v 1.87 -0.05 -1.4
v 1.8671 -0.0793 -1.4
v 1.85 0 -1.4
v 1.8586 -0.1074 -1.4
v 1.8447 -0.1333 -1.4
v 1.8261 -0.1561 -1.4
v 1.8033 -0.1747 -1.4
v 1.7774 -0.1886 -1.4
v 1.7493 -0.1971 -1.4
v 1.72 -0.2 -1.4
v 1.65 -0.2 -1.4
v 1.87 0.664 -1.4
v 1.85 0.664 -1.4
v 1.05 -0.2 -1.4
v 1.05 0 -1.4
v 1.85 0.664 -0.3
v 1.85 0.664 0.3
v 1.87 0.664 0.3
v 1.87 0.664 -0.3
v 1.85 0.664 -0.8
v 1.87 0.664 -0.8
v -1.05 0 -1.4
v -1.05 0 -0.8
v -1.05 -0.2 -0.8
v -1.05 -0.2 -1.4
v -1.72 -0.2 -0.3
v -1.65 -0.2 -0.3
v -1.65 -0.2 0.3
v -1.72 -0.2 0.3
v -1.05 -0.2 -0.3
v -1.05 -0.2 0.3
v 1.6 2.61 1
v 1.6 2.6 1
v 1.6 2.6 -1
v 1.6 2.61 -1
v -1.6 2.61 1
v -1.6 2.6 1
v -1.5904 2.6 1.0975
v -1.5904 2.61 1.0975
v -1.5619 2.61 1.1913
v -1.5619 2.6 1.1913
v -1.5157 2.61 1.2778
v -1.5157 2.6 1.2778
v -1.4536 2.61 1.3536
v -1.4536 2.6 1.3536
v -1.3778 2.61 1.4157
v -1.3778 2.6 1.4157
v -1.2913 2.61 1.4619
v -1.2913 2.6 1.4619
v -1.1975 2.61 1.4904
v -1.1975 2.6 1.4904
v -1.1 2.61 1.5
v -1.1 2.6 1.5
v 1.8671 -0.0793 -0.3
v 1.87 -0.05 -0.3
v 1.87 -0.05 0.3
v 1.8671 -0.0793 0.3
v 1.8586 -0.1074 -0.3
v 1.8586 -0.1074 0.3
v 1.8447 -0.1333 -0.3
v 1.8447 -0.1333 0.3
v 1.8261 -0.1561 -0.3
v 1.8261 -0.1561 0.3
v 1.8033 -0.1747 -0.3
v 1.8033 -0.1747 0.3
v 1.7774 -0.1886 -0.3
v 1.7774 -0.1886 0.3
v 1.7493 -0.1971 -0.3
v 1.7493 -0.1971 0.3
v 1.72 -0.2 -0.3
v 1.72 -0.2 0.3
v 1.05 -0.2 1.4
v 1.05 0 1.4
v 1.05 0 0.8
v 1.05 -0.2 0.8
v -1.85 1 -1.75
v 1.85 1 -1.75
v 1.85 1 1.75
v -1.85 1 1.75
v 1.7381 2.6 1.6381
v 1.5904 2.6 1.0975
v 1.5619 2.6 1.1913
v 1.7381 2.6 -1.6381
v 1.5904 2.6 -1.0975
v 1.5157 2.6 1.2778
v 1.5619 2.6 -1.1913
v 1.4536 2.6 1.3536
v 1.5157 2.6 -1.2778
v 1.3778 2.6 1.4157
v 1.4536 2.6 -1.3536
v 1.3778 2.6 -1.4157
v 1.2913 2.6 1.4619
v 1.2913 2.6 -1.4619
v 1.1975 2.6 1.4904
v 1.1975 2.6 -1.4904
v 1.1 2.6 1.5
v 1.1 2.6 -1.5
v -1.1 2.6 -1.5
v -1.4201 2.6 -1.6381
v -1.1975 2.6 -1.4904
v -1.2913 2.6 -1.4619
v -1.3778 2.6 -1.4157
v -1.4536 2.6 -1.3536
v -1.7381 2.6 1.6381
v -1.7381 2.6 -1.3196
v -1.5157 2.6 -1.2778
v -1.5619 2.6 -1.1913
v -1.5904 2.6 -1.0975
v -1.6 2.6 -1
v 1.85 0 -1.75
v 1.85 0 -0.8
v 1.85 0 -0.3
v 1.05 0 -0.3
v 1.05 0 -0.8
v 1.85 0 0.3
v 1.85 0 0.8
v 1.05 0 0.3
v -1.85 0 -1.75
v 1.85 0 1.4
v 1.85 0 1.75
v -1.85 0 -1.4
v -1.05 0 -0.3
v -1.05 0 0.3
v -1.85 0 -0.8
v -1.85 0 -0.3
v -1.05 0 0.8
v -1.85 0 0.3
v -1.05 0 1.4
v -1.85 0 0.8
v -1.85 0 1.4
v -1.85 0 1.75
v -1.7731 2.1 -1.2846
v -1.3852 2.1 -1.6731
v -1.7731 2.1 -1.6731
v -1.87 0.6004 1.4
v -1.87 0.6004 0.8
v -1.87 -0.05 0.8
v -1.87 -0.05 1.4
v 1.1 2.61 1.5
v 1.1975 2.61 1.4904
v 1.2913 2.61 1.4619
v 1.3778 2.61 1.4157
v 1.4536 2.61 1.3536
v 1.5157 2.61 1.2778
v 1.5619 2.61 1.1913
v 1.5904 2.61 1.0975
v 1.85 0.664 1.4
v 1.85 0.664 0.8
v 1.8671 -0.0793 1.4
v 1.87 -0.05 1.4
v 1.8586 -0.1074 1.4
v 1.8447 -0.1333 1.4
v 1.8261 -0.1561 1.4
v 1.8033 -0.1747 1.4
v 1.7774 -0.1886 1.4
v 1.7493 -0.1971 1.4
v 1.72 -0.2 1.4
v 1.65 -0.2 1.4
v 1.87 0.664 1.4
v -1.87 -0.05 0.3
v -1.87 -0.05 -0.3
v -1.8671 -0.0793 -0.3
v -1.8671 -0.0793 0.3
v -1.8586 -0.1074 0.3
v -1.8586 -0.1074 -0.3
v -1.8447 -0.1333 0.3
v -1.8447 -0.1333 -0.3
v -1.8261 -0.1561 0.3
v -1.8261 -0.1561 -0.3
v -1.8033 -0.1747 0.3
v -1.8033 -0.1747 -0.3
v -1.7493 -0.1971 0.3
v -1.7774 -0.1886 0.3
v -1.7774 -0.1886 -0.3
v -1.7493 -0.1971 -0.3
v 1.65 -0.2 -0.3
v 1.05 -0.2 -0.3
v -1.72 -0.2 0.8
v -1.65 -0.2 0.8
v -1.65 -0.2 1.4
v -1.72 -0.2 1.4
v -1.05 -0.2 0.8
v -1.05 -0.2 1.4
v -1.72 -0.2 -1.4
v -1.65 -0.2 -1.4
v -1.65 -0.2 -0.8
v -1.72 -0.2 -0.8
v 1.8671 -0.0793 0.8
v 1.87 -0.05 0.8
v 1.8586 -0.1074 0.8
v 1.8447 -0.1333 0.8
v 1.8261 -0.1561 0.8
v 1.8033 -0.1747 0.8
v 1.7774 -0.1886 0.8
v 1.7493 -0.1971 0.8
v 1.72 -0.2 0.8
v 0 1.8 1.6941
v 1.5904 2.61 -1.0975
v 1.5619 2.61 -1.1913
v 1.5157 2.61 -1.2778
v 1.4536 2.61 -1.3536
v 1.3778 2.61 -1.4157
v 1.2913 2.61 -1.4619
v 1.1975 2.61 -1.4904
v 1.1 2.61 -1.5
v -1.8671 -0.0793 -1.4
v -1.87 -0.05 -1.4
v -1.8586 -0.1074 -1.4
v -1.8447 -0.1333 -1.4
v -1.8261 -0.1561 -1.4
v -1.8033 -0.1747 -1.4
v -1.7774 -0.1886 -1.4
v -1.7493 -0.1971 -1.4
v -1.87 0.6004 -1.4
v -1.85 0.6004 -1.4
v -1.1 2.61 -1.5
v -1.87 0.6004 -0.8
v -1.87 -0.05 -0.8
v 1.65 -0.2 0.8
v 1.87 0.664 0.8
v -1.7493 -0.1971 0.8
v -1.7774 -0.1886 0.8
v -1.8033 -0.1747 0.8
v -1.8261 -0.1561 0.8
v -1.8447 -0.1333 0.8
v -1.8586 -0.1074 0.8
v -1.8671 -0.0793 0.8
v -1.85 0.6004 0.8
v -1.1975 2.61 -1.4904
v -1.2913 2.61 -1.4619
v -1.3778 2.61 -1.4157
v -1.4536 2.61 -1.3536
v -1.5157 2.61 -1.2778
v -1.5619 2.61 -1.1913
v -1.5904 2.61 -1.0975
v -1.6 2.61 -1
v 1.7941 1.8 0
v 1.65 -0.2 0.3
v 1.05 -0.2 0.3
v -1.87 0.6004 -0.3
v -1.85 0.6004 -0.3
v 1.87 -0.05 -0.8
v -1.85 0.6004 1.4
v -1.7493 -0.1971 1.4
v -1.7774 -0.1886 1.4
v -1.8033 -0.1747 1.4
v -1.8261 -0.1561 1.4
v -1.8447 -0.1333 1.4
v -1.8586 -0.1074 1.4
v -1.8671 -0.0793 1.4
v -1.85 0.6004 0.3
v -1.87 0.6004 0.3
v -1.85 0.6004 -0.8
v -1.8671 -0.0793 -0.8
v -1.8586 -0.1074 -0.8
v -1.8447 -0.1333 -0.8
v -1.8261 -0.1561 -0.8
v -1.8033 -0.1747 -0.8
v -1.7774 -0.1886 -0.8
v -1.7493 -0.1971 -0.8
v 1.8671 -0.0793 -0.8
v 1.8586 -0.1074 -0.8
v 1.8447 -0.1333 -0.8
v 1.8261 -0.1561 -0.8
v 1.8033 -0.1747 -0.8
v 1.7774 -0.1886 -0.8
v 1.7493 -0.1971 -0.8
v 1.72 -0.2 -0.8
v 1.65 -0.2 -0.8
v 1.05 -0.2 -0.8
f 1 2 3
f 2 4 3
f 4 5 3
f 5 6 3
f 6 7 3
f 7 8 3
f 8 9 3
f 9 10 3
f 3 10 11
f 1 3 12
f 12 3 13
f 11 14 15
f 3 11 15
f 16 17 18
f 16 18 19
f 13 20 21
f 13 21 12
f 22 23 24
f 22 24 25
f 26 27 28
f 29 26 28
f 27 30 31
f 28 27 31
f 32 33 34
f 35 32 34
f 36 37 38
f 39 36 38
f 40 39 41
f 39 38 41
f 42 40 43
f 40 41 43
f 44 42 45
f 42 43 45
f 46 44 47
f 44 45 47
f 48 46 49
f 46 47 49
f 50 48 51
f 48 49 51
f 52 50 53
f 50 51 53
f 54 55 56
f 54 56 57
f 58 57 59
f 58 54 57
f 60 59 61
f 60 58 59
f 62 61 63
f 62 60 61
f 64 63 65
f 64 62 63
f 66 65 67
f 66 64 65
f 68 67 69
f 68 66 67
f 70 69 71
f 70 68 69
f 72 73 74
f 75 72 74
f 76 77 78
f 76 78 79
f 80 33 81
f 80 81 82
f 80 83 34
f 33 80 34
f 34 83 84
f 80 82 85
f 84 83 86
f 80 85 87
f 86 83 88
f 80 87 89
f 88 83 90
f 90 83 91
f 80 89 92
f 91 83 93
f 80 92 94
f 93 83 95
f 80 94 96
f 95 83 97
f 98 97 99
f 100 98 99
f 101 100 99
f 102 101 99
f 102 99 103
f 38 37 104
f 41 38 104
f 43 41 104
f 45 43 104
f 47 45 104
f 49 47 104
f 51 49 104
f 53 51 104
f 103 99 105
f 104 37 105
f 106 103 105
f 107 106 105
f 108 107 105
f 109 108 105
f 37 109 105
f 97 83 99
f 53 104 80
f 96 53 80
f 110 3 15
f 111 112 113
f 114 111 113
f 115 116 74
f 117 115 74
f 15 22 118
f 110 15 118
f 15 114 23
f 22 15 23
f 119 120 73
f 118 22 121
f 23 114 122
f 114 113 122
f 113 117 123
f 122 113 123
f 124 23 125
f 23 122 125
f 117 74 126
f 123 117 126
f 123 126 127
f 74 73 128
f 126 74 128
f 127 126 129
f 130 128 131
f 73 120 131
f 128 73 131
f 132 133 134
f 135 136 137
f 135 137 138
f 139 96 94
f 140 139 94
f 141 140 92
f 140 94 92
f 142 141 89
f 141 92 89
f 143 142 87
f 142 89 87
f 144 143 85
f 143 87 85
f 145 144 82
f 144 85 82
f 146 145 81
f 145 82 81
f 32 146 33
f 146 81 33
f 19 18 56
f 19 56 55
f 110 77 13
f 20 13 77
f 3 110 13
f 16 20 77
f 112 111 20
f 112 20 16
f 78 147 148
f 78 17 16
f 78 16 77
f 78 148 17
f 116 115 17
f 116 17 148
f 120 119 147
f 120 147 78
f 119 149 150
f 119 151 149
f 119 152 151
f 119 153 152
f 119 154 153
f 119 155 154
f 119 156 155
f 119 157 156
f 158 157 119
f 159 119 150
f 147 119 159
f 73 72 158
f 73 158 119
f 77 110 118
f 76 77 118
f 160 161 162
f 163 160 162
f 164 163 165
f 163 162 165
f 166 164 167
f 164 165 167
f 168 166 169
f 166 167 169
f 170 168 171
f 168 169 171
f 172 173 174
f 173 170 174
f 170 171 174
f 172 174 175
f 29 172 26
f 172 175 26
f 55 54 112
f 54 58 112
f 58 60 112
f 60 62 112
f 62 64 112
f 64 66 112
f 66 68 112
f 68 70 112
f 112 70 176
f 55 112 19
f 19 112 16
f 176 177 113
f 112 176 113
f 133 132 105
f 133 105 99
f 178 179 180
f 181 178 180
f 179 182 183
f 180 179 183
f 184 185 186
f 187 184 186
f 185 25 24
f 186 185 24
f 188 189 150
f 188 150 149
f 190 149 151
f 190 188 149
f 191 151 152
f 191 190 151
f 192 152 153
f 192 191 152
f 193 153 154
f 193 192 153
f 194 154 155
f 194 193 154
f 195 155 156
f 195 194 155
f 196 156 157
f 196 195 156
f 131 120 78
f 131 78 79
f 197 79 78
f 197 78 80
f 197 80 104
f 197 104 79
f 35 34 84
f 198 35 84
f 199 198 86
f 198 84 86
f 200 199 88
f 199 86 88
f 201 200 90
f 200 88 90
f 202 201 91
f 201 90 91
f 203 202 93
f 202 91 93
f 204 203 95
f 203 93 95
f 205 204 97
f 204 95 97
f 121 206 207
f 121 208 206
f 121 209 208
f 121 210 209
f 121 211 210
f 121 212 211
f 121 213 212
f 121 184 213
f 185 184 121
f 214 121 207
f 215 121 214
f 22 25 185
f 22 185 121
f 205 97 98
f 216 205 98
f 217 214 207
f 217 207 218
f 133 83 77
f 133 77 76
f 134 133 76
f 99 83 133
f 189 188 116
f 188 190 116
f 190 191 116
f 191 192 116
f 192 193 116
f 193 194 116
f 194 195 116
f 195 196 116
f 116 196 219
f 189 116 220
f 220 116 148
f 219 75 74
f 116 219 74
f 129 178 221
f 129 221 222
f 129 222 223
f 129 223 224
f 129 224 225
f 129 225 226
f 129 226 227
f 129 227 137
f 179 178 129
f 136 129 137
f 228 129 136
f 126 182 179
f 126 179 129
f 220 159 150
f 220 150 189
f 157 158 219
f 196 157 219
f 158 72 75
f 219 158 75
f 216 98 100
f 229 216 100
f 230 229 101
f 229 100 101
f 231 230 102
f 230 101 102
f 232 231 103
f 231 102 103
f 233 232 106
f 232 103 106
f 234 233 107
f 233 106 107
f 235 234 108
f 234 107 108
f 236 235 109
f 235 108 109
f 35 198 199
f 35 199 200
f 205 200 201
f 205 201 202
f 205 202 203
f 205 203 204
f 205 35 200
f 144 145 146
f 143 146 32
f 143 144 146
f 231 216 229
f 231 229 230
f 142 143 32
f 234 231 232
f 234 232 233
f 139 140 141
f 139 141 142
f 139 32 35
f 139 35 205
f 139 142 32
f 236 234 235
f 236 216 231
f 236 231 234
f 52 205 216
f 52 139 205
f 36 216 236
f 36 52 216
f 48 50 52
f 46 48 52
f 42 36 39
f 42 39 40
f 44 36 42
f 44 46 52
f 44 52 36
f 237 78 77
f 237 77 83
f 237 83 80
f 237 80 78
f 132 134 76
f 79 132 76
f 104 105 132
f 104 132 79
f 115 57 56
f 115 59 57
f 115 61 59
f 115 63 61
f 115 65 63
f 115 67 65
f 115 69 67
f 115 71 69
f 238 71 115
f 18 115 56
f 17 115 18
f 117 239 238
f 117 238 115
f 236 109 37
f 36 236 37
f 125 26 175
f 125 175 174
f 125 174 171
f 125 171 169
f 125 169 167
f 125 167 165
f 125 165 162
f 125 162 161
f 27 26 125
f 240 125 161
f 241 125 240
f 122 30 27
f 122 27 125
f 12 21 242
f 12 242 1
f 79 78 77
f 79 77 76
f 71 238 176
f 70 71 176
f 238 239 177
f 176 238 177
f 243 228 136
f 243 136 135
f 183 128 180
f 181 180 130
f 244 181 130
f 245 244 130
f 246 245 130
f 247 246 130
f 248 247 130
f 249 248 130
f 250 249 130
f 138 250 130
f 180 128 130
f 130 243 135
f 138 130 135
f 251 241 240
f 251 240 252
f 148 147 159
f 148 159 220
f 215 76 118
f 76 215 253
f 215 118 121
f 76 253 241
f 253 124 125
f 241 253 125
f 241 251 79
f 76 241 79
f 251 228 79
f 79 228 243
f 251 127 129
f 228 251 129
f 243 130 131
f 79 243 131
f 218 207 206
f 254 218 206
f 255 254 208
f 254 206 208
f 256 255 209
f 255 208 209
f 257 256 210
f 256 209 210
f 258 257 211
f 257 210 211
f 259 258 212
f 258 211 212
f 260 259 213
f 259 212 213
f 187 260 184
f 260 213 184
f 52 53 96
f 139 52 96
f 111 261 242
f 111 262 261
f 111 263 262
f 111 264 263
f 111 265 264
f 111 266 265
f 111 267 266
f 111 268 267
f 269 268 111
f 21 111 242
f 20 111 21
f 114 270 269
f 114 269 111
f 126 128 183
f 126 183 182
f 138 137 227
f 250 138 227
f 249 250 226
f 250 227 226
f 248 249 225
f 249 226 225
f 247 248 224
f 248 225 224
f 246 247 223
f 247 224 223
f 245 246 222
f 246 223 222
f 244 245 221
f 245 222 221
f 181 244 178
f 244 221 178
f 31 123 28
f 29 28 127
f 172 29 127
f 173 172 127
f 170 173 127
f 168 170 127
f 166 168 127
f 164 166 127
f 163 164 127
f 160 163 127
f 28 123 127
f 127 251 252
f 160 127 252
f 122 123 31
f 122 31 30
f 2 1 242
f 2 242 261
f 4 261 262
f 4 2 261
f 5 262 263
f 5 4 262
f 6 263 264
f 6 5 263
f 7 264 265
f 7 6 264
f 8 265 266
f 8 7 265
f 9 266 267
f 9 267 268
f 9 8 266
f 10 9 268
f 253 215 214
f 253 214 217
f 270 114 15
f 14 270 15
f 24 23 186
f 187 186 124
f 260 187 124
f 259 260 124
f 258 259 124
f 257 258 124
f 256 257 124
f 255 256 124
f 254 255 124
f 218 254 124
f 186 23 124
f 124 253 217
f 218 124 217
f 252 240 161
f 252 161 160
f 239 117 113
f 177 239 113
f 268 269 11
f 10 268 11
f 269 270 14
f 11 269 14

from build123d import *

# Parameters (mm, degrees)
ESQUISSE1_W                  = 3.7
ESQUISSE1_H                  = 3.5
BOSS_EXTRU_1_DEPTH           = 1
ESQUISSE2_W                  = 3.7
ESQUISSE2_H                  = 3.5
BOSS_EXTRU_2_DEPTH           = 1.6
BOSS_EXTRU_2_TAPER           = 4
BOSS_EXTRU_3_DEPTH           = 0.01
ENL_V_MAT_EXTRU_2_DEPTH      = 0.5
ESQUISSE5_W                  = 0.8
ESQUISSE5_H                  = 0.6
BOSS_EXTRU_4_DEPTH           = 0.2
ESQUISSE6_W                  = 0.6
ESQUISSE6_H                  = 0.864001059
ENL_V_MAT_EXTRU_3_DEPTH      = 0.2
ESQUISSE8_W                  = 0.6
ESQUISSE8_H                  = 0.800354125
ENL_V_MAT_EXTRU_4_DEPTH      = 0.2
ESQUISSE9_W                  = 0.6
ESQUISSE9_H                  = 0.864001059
BOSS_EXTRU_5_DEPTH           = 0.22
ESQUISSE10_W                 = 0.6
ESQUISSE10_H                 = 0.800354125
BOSS_EXTRU_6_DEPTH           = 0.22
ENL_V_MAT_EXTRU_5_DEPTH      = 5.497944045
CORPS_D_PLACER_COPIER1_ANGLE = 180


with BuildPart() as part:
    # Esquisse1 → Boss.-Extru.1 (new body)
    with BuildSketch(Plane(origin=(0, 0, 0), x_dir=(1, 0, 0), z_dir=(0, 1, 0))):
        Rectangle(ESQUISSE1_W, ESQUISSE1_H)
    extrude(amount=BOSS_EXTRU_1_DEPTH)

    # Esquisse5 → Boss.-Extru.4 (add)
    with BuildSketch(Plane.XZ):
        with Locations((-1.45, 0)):
            Rectangle(ESQUISSE5_W, ESQUISSE5_H)
        with Locations((1.45, 0)):
            Rectangle(ESQUISSE5_W, ESQUISSE5_H)
        with Locations((1.45, 1.1)):
            Rectangle(ESQUISSE5_W, ESQUISSE5_H)
        with Locations((-1.45, 1.1)):
            Rectangle(ESQUISSE5_W, ESQUISSE5_H)
        with Locations((1.45, -1.1)):
            Rectangle(ESQUISSE5_W, ESQUISSE5_H)
        with Locations((-1.45, -1.1)):
            Rectangle(ESQUISSE5_W, ESQUISSE5_H)
    extrude(amount=BOSS_EXTRU_4_DEPTH)

    # Esquisse6 → Enlèv. mat.-Extru.3 (cut)
    with BuildSketch(Plane.ZY.offset(1.85)):
        with Locations((-1.1, 0.23200053)):
            Rectangle(ESQUISSE6_W, ESQUISSE6_H)
        with Locations((0, 0.23200053)):
            Rectangle(ESQUISSE6_W, ESQUISSE6_H)
        with Locations((1.1, 0.23200053)):
            Rectangle(ESQUISSE6_W, ESQUISSE6_H)
    extrude(amount=-ENL_V_MAT_EXTRU_3_DEPTH, mode=Mode.SUBTRACT)

    # Esquisse8 → Enlèv. mat.-Extru.4 (cut)
    with BuildSketch(Plane(origin=(1.85, 0, 0), x_dir=(0, 0, -1), z_dir=(1, 0, 0))):
        with Locations((-1.1, 0.200177063)):
            Rectangle(ESQUISSE8_W, ESQUISSE8_H)
        with Locations((0, 0.200177063)):
            Rectangle(ESQUISSE8_W, ESQUISSE8_H)
        with Locations((1.1, 0.200177063)):
            Rectangle(ESQUISSE8_W, ESQUISSE8_H)
    extrude(amount=-ENL_V_MAT_EXTRU_4_DEPTH, mode=Mode.SUBTRACT)

    # Esquisse9 → Boss.-Extru.5 (add)
    with BuildSketch(Plane.ZY.offset(1.65)):
        with Locations((-1.1, 0.23200053)):
            Rectangle(ESQUISSE9_W, ESQUISSE9_H)
        with Locations((0, 0.23200053)):
            Rectangle(ESQUISSE9_W, ESQUISSE9_H)
        with Locations((1.1, 0.23200053)):
            Rectangle(ESQUISSE9_W, ESQUISSE9_H)
    extrude(amount=BOSS_EXTRU_5_DEPTH)

    # Esquisse10 → Boss.-Extru.6 (add)
    with BuildSketch(Plane(origin=(1.65, 0, 0), x_dir=(0, 0, -1), z_dir=(1, 0, 0))):
        with Locations((-1.1, 0.200177063)):
            Rectangle(ESQUISSE10_W, ESQUISSE10_H)
        with Locations((0, 0.200177063)):
            Rectangle(ESQUISSE10_W, ESQUISSE10_H)
        with Locations((1.1, 0.200177063)):
            Rectangle(ESQUISSE10_W, ESQUISSE10_H)
    extrude(amount=BOSS_EXTRU_6_DEPTH)

    # Esquisse12 → Enlèv. mat.-Extru.5 (cut, through all)
    with BuildSketch(Plane.XY.offset(1.4)):
        with BuildLine():
            Line((-1.72, -0.2), (-2.05135205, -0.2))
            Line((-2.05135205, -0.2), (-2.05135205, 0))
            Line((-2.05135205, 0), (-1.87, 0))
            Line((-1.87, 0), (-1.87, -0.05))
            ThreePointArc((-1.87, -0.05), (-1.826066017, -0.156066017), (-1.72, -0.2))
        make_face()
        with BuildLine():
            Line((1.72, -0.2), (2.046281508, -0.2))
            Line((2.046281508, -0.2), (2.046281508, 0))
            Line((2.046281508, 0), (1.87, 0))
            Line((1.87, 0), (1.87, -0.05))
            ThreePointArc((1.87, -0.05), (1.826066017, -0.156066017), (1.72, -0.2))
        make_face()
    extrude(amount=-ENL_V_MAT_EXTRU_5_DEPTH, mode=Mode.SUBTRACT)


with BuildPart() as body_2:
    # Esquisse2 → Boss.-Extru.2 (new body)
    with BuildSketch(Plane(origin=(0, 1, 0), x_dir=(1, 0, 0), z_dir=(0, 1, 0))):
        Rectangle(ESQUISSE2_W, ESQUISSE2_H)
    extrude(amount=BOSS_EXTRU_2_DEPTH, taper=BOSS_EXTRU_2_TAPER)

    # Esquisse3 → Boss.-Extru.3 (add)
    with BuildSketch(Plane(origin=(0, 2.6, 0), x_dir=(1, 0, 0), z_dir=(0, 1, 0))):
        with BuildLine():
            Line((-1.1, -1.5), (1.1, -1.5))
            ThreePointArc((1.1, -1.5), (1.453553391, -1.353553391), (1.6, -1))
            Line((1.6, -1), (1.6, 1))
            ThreePointArc((1.6, 1), (1.453553391, 1.353553391), (1.1, 1.5))
            Line((1.1, 1.5), (-1.1, 1.5))
            ThreePointArc((-1.1, 1.5), (-1.453553391, 1.353553391), (-1.6, 1))
            Line((-1.6, 1), (-1.6, -1))
            ThreePointArc((-1.6, -1), (-1.453553391, -1.353553391), (-1.1, -1.5))
        make_face()
    extrude(amount=BOSS_EXTRU_3_DEPTH)

    # Esquisse4 → Enlèv. mat.-Extru.2 (cut)
    with BuildSketch(Plane(origin=(0, 2.6, 0), x_dir=(1, 0, 0), z_dir=(0, 1, 0))):
        Polygon((1.90586632, -1.76321677), (1.90586632, -1.151569279), (1.295152698, -1.76321677), align=None)
    extrude(amount=-ENL_V_MAT_EXTRU_2_DEPTH, mode=Mode.SUBTRACT)


with BuildPart() as body_2_1:
    # Corps-Déplacer/Copier1: moved
    add(body_2.part.rotate(Axis((0, 0, 0), (0, 1, 0)), CORPS_D_PLACER_COPIER1_ANGLE))


with BuildPart() as part_1:
    # Corps-Déplacer/Copier1: moved
    add(part.part.rotate(Axis((0, 0, 0), (0, 1, 0)), CORPS_D_PLACER_COPIER1_ANGLE))


solid = Compound([body_2_1.part, part_1.part])
